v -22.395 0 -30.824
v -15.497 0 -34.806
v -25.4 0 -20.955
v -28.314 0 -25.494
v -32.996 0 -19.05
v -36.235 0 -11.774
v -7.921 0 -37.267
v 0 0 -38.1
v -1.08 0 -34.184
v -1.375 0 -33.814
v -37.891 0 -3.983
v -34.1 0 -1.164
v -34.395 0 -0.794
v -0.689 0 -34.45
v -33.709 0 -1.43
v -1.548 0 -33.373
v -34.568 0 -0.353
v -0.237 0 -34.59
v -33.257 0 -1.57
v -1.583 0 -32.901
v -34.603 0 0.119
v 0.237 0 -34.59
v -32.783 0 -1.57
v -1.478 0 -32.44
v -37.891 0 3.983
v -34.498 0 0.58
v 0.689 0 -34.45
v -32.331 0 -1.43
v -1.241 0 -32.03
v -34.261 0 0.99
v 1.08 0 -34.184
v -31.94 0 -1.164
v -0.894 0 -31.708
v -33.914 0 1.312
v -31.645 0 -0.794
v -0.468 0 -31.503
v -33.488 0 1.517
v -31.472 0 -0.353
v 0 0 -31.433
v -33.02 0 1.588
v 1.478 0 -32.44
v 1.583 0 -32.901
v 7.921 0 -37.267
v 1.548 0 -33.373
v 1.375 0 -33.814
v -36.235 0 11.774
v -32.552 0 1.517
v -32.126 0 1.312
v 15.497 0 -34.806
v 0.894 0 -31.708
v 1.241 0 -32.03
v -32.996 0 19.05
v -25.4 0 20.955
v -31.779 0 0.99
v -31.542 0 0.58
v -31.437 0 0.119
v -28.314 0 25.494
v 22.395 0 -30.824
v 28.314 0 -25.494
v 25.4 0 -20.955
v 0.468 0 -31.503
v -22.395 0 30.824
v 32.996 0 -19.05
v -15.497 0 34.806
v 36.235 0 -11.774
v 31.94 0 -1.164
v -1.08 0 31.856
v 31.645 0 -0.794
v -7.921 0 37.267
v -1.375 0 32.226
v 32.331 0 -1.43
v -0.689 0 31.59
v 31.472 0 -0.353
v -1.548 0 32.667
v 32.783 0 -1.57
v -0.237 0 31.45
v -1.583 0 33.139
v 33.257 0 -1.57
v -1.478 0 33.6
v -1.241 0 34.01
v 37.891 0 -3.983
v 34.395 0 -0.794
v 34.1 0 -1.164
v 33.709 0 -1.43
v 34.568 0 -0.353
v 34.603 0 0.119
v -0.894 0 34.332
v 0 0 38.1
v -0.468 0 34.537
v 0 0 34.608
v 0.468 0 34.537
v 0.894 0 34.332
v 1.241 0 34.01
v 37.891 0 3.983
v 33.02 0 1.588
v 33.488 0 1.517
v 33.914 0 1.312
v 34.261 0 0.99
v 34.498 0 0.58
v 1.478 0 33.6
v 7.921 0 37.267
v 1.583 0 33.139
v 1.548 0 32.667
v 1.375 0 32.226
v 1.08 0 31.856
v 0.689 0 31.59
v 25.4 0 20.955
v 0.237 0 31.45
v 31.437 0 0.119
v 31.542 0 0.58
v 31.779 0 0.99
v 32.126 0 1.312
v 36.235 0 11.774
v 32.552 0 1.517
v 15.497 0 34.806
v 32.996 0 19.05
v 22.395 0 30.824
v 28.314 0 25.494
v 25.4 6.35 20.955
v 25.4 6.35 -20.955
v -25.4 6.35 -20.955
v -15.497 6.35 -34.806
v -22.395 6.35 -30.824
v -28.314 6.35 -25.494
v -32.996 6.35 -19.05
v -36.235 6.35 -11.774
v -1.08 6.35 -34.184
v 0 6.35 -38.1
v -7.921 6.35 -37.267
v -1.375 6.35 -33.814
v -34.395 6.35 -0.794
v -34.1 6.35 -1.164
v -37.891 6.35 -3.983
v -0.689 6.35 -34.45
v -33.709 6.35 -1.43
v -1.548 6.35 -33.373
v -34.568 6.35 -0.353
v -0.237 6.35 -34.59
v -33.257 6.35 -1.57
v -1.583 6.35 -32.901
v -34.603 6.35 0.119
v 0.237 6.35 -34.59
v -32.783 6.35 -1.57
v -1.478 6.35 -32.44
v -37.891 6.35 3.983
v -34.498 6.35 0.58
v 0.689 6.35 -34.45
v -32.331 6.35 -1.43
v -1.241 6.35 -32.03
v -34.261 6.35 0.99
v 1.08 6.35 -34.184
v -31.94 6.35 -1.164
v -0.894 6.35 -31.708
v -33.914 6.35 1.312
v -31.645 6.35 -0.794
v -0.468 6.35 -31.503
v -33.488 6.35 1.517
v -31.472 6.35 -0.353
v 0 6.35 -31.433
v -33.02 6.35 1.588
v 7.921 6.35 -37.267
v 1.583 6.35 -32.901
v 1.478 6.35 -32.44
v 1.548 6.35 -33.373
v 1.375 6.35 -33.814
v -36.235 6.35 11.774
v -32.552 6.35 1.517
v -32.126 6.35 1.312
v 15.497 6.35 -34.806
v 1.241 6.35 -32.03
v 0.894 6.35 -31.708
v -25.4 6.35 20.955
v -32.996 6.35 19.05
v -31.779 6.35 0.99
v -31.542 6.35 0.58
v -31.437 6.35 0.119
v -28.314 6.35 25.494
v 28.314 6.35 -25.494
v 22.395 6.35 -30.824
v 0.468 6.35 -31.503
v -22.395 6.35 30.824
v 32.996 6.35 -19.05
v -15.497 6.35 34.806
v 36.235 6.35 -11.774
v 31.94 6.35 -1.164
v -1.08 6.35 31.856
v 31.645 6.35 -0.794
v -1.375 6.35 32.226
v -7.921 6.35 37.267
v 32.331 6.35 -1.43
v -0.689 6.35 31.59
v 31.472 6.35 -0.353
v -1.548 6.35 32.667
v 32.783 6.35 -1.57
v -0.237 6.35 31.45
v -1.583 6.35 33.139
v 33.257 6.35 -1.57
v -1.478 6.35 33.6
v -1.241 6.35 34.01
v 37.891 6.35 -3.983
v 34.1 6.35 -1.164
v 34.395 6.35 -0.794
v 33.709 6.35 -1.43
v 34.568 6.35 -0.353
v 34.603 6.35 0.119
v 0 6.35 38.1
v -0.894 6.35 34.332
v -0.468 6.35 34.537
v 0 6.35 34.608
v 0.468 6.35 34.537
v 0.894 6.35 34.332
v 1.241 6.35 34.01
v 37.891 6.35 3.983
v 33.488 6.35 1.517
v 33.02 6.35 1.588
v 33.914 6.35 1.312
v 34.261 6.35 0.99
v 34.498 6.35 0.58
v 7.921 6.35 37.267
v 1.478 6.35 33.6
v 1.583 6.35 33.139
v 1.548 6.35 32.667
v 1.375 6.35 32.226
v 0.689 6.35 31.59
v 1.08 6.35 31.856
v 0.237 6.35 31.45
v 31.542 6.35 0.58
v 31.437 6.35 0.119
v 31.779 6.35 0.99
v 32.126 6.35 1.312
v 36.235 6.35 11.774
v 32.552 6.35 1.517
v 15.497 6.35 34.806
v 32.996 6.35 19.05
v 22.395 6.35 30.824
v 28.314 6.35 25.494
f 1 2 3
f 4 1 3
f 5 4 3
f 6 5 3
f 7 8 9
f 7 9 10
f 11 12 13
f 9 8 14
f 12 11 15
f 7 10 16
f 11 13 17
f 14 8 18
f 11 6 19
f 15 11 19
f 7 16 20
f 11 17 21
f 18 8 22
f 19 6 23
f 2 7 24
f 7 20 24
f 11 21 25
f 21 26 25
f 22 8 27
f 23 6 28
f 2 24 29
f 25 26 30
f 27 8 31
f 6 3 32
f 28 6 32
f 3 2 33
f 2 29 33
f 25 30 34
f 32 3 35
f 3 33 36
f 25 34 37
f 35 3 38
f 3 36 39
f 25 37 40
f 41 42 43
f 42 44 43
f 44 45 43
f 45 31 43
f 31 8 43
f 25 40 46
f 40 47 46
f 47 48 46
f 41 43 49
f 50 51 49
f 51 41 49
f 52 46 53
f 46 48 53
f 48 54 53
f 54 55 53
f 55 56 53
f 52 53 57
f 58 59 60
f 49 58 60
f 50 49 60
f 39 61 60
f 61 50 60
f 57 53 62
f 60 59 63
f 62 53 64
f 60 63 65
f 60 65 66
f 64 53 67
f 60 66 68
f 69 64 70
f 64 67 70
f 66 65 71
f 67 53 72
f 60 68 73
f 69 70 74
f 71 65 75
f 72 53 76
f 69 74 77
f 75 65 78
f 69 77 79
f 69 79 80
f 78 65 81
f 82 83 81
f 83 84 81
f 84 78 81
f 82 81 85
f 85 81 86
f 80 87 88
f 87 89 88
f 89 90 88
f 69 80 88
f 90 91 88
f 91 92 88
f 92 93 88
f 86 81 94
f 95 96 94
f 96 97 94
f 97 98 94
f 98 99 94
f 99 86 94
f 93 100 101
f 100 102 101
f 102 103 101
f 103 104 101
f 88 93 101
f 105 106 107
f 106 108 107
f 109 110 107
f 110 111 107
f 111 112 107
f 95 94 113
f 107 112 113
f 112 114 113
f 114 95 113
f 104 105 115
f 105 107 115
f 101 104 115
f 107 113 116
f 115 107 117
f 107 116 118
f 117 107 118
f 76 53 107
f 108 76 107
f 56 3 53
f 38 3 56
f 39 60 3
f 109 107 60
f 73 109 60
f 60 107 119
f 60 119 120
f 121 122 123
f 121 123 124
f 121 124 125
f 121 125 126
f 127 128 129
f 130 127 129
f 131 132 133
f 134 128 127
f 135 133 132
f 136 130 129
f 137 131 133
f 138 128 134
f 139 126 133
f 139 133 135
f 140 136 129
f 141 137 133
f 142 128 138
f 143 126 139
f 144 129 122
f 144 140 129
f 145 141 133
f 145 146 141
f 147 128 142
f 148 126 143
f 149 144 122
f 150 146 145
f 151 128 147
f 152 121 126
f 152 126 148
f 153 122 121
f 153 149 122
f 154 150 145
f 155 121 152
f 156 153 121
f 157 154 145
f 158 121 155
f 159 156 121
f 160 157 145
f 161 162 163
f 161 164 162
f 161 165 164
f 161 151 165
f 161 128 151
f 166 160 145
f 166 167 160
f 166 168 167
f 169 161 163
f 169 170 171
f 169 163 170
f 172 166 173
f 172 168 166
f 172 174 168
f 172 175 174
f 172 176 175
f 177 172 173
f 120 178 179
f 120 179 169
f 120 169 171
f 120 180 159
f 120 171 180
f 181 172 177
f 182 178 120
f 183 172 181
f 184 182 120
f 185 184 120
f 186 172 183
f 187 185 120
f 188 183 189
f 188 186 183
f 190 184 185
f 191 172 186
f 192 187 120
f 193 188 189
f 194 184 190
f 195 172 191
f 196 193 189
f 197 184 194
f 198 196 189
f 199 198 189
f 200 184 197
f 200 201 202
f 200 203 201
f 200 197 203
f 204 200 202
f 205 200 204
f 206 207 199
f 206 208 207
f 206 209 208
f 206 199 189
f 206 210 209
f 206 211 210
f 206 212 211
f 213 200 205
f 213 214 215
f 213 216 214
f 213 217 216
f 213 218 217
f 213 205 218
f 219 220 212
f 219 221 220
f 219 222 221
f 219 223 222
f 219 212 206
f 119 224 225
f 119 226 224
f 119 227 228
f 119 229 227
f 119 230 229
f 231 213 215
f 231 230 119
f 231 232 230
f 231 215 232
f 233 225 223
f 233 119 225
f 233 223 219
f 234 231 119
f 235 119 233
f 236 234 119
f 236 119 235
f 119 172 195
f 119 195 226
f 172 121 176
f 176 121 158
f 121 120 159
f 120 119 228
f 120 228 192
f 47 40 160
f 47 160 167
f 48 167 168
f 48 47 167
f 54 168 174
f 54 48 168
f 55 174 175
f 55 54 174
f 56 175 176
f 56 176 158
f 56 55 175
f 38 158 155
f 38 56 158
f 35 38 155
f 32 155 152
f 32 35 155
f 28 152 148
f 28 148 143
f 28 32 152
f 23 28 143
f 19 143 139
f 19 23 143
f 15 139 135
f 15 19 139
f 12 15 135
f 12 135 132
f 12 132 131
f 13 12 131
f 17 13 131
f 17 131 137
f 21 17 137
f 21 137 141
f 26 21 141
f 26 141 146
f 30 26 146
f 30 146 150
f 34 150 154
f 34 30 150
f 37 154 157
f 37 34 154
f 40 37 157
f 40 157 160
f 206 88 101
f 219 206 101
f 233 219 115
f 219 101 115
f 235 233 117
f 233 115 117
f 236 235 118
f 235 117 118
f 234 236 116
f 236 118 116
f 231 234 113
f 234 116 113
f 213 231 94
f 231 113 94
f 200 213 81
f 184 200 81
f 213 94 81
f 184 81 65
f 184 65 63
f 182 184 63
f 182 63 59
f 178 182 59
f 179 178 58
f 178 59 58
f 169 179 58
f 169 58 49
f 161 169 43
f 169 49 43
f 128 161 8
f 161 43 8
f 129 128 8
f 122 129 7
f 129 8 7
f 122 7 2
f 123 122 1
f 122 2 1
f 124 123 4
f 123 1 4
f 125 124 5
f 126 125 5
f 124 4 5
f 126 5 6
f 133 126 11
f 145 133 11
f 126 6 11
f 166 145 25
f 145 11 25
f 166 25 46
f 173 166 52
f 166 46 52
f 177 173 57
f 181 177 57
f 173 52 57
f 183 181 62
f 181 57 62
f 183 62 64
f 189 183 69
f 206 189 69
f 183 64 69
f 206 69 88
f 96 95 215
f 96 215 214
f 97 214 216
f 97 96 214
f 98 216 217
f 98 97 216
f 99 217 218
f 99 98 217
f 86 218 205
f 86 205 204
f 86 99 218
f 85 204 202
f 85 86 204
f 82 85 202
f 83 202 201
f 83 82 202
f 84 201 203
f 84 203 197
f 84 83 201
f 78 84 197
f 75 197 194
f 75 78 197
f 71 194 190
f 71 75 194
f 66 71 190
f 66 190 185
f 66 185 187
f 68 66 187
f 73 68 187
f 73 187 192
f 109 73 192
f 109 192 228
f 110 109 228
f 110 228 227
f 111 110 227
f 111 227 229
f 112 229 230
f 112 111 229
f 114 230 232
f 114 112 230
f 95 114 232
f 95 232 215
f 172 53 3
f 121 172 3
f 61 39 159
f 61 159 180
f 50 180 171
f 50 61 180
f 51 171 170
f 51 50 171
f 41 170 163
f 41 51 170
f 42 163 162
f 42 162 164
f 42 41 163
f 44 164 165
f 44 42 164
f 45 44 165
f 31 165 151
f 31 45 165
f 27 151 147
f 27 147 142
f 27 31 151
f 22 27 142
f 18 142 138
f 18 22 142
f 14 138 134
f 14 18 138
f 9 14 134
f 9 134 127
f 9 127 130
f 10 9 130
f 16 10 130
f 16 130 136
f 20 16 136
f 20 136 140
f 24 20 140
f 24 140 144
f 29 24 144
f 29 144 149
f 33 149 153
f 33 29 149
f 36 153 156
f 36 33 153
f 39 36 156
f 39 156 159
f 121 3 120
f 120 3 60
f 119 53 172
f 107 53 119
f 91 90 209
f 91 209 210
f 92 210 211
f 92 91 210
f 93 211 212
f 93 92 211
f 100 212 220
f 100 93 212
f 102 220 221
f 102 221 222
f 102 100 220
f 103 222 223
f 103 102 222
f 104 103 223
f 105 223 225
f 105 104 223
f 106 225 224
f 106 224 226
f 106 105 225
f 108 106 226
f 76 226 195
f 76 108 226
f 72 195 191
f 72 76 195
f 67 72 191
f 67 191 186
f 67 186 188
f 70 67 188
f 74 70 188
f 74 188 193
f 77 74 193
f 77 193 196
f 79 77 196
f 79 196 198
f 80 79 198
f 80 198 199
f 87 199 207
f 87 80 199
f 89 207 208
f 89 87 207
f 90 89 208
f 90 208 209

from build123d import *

# Parameters (mm, degrees)
SKETCH1_R           = 38.1
SKETCH1_R_2         = 1.5875
SKETCH1_W           = 50.8
SKETCH1_H           = 41.91
BOSS_EXTRUDE1_DEPTH = 6.35


with BuildPart() as part:
    # Sketch1 → Boss-Extrude1 (new body)
    with BuildSketch(Plane(origin=(0, 0, 0), x_dir=(1, 0, 0), z_dir=(0, 1, 0))):
        with Locations(Location((0, 0, 0), (0, 0, 270))):
            Circle(SKETCH1_R)
        with Locations(Location((0, 33.02, 0), (0, 0, 270))):
            Circle(SKETCH1_R_2, mode=Mode.SUBTRACT)
        with Locations(Location((33.02, 0, 0), (0, 0, 270))):
            Circle(SKETCH1_R_2, mode=Mode.SUBTRACT)
        with Locations(Location((0, -33.02, 0), (0, 0, 270))):
            Circle(SKETCH1_R_2, mode=Mode.SUBTRACT)
        with Locations(Location((-33.02, 0, 0), (0, 0, 270))):
            Circle(SKETCH1_R_2, mode=Mode.SUBTRACT)
        Rectangle(SKETCH1_W, SKETCH1_H, mode=Mode.SUBTRACT)
    extrude(amount=BOSS_EXTRUDE1_DEPTH)


solid = part.part
